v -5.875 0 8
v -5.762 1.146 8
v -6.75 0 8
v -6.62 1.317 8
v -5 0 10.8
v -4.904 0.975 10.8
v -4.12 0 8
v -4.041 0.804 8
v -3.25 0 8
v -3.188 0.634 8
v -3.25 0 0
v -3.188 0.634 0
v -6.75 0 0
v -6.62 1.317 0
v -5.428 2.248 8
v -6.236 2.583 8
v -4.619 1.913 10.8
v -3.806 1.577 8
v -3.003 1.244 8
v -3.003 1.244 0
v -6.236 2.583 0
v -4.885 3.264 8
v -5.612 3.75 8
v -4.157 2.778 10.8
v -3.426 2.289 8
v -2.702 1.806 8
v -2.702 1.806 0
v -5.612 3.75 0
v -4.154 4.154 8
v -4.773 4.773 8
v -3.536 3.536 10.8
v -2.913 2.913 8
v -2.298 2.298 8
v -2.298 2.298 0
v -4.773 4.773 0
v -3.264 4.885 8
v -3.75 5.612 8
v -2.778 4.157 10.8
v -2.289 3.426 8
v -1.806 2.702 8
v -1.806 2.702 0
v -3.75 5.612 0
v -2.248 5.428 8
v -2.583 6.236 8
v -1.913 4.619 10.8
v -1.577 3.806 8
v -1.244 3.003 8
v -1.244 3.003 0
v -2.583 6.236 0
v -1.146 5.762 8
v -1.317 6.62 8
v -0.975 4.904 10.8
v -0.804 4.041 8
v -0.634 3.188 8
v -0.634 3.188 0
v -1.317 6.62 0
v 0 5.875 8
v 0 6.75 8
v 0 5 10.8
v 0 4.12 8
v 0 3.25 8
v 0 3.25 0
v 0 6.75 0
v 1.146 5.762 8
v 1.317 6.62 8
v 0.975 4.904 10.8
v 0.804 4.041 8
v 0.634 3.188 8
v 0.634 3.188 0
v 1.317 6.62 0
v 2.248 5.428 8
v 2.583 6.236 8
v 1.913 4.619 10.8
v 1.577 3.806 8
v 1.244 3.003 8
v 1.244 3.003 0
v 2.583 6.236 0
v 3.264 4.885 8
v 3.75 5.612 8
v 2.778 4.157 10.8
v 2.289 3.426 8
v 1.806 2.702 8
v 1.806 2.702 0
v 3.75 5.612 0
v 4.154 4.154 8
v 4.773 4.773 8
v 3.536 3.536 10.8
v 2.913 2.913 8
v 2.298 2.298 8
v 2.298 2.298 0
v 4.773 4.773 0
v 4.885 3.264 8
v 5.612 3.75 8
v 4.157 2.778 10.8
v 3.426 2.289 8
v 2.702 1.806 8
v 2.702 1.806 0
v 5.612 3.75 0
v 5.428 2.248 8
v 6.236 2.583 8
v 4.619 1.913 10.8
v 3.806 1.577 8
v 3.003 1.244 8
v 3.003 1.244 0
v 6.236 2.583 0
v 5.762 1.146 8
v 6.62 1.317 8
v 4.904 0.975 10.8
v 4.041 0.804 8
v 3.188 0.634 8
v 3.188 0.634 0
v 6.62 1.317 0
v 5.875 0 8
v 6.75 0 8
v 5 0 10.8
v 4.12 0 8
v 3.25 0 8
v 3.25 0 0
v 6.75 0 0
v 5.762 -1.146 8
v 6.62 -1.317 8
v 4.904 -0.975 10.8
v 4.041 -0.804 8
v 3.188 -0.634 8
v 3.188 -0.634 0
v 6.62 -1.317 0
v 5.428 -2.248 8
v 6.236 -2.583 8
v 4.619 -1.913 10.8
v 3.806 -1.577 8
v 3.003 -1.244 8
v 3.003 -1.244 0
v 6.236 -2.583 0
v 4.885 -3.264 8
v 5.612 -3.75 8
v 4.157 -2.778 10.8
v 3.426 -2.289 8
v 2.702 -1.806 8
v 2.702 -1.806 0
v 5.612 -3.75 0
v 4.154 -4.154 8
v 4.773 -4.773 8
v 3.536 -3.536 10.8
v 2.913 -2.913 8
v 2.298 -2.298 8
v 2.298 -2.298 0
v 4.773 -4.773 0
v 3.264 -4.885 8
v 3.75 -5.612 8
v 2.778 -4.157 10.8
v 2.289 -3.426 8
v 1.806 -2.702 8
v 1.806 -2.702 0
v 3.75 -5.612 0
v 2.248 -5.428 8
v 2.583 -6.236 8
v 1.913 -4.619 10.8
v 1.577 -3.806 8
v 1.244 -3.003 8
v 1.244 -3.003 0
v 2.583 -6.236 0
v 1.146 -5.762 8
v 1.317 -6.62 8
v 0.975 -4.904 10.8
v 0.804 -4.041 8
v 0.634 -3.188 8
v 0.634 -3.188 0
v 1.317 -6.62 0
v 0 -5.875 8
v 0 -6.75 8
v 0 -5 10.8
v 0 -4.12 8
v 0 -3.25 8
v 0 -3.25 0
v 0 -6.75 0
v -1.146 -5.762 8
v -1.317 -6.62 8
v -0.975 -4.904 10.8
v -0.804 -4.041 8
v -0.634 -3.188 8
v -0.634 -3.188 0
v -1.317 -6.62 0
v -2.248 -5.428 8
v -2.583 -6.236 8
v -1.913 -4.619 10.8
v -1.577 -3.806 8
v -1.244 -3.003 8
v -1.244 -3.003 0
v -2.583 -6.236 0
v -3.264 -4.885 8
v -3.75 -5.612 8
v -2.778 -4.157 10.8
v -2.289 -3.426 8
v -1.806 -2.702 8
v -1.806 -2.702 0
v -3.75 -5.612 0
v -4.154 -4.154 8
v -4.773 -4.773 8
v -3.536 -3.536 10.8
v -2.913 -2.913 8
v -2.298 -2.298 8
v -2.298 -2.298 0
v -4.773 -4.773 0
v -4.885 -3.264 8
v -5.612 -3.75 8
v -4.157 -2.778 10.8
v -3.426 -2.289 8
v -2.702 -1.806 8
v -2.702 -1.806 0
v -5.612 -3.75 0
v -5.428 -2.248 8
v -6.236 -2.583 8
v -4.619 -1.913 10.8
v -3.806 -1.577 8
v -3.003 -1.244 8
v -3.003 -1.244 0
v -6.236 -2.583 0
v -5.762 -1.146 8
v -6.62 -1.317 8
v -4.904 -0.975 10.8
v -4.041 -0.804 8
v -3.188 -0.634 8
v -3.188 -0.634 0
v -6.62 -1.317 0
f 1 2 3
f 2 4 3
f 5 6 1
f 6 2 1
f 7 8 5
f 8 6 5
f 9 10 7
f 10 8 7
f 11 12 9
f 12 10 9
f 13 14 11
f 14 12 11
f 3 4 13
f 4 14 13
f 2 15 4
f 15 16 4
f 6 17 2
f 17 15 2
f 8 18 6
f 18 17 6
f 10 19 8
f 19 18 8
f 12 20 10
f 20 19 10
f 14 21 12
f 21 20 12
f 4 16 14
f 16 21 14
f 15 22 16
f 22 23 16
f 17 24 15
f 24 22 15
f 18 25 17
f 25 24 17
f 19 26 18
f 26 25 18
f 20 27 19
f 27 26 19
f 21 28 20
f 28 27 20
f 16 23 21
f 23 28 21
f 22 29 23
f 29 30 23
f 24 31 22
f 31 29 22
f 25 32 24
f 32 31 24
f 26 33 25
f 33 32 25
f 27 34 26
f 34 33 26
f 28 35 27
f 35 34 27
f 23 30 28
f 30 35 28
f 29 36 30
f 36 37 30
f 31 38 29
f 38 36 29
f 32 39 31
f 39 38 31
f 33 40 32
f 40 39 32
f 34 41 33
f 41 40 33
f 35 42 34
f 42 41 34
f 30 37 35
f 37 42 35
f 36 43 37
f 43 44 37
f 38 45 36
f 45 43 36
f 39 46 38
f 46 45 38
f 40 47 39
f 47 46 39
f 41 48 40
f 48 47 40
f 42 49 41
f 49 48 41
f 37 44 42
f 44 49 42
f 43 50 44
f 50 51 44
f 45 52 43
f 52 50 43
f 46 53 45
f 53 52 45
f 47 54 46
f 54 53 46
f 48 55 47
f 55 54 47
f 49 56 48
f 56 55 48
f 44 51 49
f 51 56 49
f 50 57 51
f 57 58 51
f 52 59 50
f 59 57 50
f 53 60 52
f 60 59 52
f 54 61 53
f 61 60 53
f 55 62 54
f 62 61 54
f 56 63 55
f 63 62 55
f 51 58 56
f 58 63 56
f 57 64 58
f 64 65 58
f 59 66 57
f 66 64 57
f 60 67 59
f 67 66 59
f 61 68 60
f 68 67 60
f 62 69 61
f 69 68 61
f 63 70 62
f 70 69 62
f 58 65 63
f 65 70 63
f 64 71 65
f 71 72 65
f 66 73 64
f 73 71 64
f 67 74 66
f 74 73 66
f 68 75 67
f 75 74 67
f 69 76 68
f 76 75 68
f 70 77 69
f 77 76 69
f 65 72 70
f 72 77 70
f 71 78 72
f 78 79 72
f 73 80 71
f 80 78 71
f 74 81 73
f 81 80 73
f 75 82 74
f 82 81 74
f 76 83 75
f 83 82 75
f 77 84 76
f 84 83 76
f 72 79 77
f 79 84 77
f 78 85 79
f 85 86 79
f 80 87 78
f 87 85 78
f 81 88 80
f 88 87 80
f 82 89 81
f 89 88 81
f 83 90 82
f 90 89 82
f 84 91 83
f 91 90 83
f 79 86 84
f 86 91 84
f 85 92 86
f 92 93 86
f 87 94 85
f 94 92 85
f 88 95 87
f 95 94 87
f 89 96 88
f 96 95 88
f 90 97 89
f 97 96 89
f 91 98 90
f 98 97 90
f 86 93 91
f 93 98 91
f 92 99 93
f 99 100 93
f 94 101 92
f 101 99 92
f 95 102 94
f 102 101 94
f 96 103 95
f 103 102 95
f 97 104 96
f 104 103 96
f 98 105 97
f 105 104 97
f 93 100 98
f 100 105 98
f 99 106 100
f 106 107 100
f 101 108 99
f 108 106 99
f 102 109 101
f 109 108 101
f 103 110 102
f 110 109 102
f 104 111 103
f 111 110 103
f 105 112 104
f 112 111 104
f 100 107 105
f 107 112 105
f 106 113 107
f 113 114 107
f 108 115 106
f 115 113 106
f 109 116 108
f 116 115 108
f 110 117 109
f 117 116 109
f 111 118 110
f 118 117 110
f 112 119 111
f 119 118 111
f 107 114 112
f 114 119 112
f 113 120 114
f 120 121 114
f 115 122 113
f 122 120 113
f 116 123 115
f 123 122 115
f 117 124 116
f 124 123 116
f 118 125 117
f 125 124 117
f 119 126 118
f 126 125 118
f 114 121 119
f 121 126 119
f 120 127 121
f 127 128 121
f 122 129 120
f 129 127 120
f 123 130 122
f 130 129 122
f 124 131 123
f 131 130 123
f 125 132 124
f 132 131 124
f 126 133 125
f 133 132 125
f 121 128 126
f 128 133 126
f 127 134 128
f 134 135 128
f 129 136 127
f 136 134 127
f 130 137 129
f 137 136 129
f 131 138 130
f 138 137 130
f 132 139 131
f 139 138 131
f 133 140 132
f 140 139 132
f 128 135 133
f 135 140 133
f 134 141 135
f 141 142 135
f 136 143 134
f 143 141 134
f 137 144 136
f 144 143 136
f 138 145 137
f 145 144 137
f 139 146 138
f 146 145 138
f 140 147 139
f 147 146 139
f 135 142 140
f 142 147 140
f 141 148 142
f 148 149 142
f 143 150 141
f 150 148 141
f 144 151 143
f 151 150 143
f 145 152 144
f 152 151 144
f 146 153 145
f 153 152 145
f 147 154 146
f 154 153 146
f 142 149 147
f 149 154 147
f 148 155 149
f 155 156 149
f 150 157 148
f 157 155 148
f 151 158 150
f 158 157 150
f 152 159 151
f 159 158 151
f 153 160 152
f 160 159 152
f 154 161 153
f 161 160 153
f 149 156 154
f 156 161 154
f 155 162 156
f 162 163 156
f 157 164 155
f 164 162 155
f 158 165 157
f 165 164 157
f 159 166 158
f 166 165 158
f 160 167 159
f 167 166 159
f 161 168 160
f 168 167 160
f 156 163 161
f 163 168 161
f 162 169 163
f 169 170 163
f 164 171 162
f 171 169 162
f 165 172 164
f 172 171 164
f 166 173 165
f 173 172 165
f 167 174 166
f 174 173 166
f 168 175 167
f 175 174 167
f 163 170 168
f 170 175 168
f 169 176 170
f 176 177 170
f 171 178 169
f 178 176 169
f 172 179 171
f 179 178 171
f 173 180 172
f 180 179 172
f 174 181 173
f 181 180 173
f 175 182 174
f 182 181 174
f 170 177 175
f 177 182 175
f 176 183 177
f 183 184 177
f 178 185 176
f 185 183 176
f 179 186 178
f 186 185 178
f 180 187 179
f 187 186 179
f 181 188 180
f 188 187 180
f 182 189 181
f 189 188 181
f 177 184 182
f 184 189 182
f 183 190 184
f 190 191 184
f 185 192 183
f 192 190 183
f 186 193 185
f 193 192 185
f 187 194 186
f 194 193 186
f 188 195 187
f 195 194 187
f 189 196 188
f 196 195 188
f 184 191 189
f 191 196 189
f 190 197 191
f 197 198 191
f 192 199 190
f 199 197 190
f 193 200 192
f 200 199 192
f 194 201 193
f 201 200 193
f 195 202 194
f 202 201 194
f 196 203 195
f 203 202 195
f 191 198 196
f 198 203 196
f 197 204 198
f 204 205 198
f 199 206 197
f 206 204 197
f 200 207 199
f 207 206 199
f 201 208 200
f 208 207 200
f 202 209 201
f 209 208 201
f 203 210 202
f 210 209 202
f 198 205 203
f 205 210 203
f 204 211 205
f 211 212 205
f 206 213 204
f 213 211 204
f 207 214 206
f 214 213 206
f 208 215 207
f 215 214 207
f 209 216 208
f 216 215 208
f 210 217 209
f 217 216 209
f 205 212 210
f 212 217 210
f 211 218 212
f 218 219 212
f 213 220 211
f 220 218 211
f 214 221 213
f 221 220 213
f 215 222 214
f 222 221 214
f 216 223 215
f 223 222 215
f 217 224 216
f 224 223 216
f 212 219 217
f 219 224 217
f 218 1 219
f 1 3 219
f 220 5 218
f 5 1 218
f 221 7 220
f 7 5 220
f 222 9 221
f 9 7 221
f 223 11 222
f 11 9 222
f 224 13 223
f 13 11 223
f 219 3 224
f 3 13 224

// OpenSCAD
$fn = 32;

// ----------------------------------------------------------------------
// Form washer: domed washer, 13.5 mm outside, 6.5 mm bore
// ----------------------------------------------------------------------

// --- parameters (mm) ---
revolve_angle = 360;      // full turn around the Z axis
profile_points = 7;       // points of the closed outline

profile = [[3.25, 0], [6.75, 0], [6.75, 8], [5.875, 8], [5, 10.8], [4.12, 8], [3.25, 8]];  // single closed polygon, 7 points, counter clockwise

// --- the one profile operation ---
rotate_extrude(angle = revolve_angle) polygon(points = profile);
